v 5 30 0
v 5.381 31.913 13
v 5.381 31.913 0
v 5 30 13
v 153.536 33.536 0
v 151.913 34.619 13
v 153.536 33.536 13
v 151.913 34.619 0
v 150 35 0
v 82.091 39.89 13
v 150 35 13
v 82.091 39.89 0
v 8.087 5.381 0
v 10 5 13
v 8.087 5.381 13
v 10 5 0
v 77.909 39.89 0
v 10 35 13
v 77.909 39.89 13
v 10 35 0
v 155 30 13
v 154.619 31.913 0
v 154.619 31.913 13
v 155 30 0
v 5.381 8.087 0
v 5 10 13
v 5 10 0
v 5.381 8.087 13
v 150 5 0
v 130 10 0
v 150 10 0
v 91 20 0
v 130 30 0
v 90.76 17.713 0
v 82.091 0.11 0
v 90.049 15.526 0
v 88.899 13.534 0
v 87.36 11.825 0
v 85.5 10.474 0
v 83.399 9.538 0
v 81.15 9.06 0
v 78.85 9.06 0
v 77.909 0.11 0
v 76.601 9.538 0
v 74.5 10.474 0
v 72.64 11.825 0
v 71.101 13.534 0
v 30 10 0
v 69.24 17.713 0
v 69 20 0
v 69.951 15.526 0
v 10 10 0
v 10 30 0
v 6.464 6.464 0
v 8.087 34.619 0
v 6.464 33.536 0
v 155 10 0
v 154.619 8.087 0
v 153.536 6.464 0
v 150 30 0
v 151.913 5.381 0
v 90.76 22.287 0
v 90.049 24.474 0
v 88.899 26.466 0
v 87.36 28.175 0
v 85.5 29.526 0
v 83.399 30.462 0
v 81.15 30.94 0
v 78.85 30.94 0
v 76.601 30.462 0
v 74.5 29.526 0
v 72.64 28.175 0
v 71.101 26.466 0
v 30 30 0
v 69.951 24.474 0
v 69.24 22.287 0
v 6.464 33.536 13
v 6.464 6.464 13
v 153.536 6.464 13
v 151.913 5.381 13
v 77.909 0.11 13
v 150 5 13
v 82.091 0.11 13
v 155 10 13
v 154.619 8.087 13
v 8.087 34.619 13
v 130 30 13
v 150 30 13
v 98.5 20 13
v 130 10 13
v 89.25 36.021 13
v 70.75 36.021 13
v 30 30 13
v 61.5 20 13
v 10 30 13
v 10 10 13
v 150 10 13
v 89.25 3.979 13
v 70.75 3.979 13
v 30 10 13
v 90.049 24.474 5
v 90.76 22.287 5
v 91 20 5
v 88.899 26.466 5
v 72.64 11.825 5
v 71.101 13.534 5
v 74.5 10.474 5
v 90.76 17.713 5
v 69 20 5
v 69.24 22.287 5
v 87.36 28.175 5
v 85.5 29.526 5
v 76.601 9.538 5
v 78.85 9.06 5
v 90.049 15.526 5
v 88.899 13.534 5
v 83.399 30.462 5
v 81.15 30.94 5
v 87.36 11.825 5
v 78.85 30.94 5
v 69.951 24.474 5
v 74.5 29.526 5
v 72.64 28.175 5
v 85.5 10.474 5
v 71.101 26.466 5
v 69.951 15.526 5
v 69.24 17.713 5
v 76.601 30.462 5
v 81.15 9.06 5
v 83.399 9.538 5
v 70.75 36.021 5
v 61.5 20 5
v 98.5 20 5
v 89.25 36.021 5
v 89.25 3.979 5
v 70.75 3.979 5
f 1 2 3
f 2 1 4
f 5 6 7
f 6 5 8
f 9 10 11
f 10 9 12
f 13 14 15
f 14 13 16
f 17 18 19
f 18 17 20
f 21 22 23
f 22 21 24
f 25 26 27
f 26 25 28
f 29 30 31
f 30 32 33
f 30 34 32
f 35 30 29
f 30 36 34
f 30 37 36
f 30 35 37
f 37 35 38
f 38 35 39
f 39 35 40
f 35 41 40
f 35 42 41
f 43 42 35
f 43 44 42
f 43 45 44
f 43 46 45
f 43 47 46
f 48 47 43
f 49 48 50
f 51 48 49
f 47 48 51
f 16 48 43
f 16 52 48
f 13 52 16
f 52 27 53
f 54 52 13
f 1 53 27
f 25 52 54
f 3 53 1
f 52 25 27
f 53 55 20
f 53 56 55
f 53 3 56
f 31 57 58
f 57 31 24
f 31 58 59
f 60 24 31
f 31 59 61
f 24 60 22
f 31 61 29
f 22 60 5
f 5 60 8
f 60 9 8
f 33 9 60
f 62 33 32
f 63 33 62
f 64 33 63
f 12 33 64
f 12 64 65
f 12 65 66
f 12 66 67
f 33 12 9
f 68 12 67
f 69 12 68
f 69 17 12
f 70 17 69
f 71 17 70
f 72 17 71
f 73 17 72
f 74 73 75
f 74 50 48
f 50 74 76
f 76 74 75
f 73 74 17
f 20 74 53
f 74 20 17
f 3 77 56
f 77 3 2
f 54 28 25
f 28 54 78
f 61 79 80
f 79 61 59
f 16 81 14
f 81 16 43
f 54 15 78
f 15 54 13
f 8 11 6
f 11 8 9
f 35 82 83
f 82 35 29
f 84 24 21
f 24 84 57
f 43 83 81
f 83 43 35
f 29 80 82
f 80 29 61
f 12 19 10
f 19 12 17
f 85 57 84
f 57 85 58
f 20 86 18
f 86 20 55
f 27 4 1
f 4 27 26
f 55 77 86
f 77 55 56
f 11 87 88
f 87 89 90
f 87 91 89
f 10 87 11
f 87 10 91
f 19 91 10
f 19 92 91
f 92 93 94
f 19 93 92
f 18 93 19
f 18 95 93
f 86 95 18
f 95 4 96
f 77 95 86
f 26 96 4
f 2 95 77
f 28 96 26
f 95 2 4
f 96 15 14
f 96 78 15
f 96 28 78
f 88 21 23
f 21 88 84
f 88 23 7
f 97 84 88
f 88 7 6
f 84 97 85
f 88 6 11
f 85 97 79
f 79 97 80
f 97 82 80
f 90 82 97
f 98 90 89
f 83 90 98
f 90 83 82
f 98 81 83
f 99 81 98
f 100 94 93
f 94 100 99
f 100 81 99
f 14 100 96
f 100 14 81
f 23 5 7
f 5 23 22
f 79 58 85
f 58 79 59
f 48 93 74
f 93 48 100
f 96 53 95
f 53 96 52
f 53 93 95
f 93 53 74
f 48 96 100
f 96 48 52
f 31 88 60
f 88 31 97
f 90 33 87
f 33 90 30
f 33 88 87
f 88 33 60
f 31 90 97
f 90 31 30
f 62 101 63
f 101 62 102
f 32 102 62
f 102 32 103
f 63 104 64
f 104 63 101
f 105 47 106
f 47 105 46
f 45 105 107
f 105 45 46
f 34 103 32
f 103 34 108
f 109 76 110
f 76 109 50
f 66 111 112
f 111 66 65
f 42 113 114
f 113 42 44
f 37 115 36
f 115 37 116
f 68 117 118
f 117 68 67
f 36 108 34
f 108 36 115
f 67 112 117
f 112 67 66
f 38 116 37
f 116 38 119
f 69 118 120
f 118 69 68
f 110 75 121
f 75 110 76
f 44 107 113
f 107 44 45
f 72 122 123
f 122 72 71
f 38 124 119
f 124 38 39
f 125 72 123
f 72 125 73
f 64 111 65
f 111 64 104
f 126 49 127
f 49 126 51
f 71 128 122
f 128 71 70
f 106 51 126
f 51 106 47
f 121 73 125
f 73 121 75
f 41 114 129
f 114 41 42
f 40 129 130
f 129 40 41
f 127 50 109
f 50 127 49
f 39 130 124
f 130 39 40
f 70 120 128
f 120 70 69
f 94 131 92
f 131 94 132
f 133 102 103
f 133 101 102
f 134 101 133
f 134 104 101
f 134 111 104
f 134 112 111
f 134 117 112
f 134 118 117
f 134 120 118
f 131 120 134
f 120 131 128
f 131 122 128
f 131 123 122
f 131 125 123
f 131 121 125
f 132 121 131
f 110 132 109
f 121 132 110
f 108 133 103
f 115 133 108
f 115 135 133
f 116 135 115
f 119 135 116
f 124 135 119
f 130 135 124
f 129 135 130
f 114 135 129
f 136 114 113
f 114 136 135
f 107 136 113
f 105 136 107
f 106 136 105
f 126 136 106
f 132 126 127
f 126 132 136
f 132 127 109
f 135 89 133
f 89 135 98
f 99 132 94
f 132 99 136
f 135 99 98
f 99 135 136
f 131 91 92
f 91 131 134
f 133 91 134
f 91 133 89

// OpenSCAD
module regular_polygon(order, r=1){
    angles=[ for (i = [0:order-1]) i*(360/order) ];
    coords=[ for (th=angles) [r*cos(th), r*sin(th)] ];
    polygon(coords);
}

difference() {
    hull() {
        translate([10,10,0]) cylinder(h=13, r=5);
        translate([10,30,0]) cylinder(h=13, r=5);
        translate([80,20,0]) cylinder(h=13, r=20);
        translate([150,10,0]) cylinder(h=13, r=5);
        translate([150,30,0]) cylinder(h=13, r=5);
    }
    //cube([160,40,13]);
    translate([10,10,0]) cube([20,20,25]);
    translate([130,10,0]) cube([20,20,25]);
    translate([80,20,0]) cylinder(h=50, r=11);
    translate([80,20,5]) linear_extrude(height=40) regular_polygon(6, r=18.5);
}
